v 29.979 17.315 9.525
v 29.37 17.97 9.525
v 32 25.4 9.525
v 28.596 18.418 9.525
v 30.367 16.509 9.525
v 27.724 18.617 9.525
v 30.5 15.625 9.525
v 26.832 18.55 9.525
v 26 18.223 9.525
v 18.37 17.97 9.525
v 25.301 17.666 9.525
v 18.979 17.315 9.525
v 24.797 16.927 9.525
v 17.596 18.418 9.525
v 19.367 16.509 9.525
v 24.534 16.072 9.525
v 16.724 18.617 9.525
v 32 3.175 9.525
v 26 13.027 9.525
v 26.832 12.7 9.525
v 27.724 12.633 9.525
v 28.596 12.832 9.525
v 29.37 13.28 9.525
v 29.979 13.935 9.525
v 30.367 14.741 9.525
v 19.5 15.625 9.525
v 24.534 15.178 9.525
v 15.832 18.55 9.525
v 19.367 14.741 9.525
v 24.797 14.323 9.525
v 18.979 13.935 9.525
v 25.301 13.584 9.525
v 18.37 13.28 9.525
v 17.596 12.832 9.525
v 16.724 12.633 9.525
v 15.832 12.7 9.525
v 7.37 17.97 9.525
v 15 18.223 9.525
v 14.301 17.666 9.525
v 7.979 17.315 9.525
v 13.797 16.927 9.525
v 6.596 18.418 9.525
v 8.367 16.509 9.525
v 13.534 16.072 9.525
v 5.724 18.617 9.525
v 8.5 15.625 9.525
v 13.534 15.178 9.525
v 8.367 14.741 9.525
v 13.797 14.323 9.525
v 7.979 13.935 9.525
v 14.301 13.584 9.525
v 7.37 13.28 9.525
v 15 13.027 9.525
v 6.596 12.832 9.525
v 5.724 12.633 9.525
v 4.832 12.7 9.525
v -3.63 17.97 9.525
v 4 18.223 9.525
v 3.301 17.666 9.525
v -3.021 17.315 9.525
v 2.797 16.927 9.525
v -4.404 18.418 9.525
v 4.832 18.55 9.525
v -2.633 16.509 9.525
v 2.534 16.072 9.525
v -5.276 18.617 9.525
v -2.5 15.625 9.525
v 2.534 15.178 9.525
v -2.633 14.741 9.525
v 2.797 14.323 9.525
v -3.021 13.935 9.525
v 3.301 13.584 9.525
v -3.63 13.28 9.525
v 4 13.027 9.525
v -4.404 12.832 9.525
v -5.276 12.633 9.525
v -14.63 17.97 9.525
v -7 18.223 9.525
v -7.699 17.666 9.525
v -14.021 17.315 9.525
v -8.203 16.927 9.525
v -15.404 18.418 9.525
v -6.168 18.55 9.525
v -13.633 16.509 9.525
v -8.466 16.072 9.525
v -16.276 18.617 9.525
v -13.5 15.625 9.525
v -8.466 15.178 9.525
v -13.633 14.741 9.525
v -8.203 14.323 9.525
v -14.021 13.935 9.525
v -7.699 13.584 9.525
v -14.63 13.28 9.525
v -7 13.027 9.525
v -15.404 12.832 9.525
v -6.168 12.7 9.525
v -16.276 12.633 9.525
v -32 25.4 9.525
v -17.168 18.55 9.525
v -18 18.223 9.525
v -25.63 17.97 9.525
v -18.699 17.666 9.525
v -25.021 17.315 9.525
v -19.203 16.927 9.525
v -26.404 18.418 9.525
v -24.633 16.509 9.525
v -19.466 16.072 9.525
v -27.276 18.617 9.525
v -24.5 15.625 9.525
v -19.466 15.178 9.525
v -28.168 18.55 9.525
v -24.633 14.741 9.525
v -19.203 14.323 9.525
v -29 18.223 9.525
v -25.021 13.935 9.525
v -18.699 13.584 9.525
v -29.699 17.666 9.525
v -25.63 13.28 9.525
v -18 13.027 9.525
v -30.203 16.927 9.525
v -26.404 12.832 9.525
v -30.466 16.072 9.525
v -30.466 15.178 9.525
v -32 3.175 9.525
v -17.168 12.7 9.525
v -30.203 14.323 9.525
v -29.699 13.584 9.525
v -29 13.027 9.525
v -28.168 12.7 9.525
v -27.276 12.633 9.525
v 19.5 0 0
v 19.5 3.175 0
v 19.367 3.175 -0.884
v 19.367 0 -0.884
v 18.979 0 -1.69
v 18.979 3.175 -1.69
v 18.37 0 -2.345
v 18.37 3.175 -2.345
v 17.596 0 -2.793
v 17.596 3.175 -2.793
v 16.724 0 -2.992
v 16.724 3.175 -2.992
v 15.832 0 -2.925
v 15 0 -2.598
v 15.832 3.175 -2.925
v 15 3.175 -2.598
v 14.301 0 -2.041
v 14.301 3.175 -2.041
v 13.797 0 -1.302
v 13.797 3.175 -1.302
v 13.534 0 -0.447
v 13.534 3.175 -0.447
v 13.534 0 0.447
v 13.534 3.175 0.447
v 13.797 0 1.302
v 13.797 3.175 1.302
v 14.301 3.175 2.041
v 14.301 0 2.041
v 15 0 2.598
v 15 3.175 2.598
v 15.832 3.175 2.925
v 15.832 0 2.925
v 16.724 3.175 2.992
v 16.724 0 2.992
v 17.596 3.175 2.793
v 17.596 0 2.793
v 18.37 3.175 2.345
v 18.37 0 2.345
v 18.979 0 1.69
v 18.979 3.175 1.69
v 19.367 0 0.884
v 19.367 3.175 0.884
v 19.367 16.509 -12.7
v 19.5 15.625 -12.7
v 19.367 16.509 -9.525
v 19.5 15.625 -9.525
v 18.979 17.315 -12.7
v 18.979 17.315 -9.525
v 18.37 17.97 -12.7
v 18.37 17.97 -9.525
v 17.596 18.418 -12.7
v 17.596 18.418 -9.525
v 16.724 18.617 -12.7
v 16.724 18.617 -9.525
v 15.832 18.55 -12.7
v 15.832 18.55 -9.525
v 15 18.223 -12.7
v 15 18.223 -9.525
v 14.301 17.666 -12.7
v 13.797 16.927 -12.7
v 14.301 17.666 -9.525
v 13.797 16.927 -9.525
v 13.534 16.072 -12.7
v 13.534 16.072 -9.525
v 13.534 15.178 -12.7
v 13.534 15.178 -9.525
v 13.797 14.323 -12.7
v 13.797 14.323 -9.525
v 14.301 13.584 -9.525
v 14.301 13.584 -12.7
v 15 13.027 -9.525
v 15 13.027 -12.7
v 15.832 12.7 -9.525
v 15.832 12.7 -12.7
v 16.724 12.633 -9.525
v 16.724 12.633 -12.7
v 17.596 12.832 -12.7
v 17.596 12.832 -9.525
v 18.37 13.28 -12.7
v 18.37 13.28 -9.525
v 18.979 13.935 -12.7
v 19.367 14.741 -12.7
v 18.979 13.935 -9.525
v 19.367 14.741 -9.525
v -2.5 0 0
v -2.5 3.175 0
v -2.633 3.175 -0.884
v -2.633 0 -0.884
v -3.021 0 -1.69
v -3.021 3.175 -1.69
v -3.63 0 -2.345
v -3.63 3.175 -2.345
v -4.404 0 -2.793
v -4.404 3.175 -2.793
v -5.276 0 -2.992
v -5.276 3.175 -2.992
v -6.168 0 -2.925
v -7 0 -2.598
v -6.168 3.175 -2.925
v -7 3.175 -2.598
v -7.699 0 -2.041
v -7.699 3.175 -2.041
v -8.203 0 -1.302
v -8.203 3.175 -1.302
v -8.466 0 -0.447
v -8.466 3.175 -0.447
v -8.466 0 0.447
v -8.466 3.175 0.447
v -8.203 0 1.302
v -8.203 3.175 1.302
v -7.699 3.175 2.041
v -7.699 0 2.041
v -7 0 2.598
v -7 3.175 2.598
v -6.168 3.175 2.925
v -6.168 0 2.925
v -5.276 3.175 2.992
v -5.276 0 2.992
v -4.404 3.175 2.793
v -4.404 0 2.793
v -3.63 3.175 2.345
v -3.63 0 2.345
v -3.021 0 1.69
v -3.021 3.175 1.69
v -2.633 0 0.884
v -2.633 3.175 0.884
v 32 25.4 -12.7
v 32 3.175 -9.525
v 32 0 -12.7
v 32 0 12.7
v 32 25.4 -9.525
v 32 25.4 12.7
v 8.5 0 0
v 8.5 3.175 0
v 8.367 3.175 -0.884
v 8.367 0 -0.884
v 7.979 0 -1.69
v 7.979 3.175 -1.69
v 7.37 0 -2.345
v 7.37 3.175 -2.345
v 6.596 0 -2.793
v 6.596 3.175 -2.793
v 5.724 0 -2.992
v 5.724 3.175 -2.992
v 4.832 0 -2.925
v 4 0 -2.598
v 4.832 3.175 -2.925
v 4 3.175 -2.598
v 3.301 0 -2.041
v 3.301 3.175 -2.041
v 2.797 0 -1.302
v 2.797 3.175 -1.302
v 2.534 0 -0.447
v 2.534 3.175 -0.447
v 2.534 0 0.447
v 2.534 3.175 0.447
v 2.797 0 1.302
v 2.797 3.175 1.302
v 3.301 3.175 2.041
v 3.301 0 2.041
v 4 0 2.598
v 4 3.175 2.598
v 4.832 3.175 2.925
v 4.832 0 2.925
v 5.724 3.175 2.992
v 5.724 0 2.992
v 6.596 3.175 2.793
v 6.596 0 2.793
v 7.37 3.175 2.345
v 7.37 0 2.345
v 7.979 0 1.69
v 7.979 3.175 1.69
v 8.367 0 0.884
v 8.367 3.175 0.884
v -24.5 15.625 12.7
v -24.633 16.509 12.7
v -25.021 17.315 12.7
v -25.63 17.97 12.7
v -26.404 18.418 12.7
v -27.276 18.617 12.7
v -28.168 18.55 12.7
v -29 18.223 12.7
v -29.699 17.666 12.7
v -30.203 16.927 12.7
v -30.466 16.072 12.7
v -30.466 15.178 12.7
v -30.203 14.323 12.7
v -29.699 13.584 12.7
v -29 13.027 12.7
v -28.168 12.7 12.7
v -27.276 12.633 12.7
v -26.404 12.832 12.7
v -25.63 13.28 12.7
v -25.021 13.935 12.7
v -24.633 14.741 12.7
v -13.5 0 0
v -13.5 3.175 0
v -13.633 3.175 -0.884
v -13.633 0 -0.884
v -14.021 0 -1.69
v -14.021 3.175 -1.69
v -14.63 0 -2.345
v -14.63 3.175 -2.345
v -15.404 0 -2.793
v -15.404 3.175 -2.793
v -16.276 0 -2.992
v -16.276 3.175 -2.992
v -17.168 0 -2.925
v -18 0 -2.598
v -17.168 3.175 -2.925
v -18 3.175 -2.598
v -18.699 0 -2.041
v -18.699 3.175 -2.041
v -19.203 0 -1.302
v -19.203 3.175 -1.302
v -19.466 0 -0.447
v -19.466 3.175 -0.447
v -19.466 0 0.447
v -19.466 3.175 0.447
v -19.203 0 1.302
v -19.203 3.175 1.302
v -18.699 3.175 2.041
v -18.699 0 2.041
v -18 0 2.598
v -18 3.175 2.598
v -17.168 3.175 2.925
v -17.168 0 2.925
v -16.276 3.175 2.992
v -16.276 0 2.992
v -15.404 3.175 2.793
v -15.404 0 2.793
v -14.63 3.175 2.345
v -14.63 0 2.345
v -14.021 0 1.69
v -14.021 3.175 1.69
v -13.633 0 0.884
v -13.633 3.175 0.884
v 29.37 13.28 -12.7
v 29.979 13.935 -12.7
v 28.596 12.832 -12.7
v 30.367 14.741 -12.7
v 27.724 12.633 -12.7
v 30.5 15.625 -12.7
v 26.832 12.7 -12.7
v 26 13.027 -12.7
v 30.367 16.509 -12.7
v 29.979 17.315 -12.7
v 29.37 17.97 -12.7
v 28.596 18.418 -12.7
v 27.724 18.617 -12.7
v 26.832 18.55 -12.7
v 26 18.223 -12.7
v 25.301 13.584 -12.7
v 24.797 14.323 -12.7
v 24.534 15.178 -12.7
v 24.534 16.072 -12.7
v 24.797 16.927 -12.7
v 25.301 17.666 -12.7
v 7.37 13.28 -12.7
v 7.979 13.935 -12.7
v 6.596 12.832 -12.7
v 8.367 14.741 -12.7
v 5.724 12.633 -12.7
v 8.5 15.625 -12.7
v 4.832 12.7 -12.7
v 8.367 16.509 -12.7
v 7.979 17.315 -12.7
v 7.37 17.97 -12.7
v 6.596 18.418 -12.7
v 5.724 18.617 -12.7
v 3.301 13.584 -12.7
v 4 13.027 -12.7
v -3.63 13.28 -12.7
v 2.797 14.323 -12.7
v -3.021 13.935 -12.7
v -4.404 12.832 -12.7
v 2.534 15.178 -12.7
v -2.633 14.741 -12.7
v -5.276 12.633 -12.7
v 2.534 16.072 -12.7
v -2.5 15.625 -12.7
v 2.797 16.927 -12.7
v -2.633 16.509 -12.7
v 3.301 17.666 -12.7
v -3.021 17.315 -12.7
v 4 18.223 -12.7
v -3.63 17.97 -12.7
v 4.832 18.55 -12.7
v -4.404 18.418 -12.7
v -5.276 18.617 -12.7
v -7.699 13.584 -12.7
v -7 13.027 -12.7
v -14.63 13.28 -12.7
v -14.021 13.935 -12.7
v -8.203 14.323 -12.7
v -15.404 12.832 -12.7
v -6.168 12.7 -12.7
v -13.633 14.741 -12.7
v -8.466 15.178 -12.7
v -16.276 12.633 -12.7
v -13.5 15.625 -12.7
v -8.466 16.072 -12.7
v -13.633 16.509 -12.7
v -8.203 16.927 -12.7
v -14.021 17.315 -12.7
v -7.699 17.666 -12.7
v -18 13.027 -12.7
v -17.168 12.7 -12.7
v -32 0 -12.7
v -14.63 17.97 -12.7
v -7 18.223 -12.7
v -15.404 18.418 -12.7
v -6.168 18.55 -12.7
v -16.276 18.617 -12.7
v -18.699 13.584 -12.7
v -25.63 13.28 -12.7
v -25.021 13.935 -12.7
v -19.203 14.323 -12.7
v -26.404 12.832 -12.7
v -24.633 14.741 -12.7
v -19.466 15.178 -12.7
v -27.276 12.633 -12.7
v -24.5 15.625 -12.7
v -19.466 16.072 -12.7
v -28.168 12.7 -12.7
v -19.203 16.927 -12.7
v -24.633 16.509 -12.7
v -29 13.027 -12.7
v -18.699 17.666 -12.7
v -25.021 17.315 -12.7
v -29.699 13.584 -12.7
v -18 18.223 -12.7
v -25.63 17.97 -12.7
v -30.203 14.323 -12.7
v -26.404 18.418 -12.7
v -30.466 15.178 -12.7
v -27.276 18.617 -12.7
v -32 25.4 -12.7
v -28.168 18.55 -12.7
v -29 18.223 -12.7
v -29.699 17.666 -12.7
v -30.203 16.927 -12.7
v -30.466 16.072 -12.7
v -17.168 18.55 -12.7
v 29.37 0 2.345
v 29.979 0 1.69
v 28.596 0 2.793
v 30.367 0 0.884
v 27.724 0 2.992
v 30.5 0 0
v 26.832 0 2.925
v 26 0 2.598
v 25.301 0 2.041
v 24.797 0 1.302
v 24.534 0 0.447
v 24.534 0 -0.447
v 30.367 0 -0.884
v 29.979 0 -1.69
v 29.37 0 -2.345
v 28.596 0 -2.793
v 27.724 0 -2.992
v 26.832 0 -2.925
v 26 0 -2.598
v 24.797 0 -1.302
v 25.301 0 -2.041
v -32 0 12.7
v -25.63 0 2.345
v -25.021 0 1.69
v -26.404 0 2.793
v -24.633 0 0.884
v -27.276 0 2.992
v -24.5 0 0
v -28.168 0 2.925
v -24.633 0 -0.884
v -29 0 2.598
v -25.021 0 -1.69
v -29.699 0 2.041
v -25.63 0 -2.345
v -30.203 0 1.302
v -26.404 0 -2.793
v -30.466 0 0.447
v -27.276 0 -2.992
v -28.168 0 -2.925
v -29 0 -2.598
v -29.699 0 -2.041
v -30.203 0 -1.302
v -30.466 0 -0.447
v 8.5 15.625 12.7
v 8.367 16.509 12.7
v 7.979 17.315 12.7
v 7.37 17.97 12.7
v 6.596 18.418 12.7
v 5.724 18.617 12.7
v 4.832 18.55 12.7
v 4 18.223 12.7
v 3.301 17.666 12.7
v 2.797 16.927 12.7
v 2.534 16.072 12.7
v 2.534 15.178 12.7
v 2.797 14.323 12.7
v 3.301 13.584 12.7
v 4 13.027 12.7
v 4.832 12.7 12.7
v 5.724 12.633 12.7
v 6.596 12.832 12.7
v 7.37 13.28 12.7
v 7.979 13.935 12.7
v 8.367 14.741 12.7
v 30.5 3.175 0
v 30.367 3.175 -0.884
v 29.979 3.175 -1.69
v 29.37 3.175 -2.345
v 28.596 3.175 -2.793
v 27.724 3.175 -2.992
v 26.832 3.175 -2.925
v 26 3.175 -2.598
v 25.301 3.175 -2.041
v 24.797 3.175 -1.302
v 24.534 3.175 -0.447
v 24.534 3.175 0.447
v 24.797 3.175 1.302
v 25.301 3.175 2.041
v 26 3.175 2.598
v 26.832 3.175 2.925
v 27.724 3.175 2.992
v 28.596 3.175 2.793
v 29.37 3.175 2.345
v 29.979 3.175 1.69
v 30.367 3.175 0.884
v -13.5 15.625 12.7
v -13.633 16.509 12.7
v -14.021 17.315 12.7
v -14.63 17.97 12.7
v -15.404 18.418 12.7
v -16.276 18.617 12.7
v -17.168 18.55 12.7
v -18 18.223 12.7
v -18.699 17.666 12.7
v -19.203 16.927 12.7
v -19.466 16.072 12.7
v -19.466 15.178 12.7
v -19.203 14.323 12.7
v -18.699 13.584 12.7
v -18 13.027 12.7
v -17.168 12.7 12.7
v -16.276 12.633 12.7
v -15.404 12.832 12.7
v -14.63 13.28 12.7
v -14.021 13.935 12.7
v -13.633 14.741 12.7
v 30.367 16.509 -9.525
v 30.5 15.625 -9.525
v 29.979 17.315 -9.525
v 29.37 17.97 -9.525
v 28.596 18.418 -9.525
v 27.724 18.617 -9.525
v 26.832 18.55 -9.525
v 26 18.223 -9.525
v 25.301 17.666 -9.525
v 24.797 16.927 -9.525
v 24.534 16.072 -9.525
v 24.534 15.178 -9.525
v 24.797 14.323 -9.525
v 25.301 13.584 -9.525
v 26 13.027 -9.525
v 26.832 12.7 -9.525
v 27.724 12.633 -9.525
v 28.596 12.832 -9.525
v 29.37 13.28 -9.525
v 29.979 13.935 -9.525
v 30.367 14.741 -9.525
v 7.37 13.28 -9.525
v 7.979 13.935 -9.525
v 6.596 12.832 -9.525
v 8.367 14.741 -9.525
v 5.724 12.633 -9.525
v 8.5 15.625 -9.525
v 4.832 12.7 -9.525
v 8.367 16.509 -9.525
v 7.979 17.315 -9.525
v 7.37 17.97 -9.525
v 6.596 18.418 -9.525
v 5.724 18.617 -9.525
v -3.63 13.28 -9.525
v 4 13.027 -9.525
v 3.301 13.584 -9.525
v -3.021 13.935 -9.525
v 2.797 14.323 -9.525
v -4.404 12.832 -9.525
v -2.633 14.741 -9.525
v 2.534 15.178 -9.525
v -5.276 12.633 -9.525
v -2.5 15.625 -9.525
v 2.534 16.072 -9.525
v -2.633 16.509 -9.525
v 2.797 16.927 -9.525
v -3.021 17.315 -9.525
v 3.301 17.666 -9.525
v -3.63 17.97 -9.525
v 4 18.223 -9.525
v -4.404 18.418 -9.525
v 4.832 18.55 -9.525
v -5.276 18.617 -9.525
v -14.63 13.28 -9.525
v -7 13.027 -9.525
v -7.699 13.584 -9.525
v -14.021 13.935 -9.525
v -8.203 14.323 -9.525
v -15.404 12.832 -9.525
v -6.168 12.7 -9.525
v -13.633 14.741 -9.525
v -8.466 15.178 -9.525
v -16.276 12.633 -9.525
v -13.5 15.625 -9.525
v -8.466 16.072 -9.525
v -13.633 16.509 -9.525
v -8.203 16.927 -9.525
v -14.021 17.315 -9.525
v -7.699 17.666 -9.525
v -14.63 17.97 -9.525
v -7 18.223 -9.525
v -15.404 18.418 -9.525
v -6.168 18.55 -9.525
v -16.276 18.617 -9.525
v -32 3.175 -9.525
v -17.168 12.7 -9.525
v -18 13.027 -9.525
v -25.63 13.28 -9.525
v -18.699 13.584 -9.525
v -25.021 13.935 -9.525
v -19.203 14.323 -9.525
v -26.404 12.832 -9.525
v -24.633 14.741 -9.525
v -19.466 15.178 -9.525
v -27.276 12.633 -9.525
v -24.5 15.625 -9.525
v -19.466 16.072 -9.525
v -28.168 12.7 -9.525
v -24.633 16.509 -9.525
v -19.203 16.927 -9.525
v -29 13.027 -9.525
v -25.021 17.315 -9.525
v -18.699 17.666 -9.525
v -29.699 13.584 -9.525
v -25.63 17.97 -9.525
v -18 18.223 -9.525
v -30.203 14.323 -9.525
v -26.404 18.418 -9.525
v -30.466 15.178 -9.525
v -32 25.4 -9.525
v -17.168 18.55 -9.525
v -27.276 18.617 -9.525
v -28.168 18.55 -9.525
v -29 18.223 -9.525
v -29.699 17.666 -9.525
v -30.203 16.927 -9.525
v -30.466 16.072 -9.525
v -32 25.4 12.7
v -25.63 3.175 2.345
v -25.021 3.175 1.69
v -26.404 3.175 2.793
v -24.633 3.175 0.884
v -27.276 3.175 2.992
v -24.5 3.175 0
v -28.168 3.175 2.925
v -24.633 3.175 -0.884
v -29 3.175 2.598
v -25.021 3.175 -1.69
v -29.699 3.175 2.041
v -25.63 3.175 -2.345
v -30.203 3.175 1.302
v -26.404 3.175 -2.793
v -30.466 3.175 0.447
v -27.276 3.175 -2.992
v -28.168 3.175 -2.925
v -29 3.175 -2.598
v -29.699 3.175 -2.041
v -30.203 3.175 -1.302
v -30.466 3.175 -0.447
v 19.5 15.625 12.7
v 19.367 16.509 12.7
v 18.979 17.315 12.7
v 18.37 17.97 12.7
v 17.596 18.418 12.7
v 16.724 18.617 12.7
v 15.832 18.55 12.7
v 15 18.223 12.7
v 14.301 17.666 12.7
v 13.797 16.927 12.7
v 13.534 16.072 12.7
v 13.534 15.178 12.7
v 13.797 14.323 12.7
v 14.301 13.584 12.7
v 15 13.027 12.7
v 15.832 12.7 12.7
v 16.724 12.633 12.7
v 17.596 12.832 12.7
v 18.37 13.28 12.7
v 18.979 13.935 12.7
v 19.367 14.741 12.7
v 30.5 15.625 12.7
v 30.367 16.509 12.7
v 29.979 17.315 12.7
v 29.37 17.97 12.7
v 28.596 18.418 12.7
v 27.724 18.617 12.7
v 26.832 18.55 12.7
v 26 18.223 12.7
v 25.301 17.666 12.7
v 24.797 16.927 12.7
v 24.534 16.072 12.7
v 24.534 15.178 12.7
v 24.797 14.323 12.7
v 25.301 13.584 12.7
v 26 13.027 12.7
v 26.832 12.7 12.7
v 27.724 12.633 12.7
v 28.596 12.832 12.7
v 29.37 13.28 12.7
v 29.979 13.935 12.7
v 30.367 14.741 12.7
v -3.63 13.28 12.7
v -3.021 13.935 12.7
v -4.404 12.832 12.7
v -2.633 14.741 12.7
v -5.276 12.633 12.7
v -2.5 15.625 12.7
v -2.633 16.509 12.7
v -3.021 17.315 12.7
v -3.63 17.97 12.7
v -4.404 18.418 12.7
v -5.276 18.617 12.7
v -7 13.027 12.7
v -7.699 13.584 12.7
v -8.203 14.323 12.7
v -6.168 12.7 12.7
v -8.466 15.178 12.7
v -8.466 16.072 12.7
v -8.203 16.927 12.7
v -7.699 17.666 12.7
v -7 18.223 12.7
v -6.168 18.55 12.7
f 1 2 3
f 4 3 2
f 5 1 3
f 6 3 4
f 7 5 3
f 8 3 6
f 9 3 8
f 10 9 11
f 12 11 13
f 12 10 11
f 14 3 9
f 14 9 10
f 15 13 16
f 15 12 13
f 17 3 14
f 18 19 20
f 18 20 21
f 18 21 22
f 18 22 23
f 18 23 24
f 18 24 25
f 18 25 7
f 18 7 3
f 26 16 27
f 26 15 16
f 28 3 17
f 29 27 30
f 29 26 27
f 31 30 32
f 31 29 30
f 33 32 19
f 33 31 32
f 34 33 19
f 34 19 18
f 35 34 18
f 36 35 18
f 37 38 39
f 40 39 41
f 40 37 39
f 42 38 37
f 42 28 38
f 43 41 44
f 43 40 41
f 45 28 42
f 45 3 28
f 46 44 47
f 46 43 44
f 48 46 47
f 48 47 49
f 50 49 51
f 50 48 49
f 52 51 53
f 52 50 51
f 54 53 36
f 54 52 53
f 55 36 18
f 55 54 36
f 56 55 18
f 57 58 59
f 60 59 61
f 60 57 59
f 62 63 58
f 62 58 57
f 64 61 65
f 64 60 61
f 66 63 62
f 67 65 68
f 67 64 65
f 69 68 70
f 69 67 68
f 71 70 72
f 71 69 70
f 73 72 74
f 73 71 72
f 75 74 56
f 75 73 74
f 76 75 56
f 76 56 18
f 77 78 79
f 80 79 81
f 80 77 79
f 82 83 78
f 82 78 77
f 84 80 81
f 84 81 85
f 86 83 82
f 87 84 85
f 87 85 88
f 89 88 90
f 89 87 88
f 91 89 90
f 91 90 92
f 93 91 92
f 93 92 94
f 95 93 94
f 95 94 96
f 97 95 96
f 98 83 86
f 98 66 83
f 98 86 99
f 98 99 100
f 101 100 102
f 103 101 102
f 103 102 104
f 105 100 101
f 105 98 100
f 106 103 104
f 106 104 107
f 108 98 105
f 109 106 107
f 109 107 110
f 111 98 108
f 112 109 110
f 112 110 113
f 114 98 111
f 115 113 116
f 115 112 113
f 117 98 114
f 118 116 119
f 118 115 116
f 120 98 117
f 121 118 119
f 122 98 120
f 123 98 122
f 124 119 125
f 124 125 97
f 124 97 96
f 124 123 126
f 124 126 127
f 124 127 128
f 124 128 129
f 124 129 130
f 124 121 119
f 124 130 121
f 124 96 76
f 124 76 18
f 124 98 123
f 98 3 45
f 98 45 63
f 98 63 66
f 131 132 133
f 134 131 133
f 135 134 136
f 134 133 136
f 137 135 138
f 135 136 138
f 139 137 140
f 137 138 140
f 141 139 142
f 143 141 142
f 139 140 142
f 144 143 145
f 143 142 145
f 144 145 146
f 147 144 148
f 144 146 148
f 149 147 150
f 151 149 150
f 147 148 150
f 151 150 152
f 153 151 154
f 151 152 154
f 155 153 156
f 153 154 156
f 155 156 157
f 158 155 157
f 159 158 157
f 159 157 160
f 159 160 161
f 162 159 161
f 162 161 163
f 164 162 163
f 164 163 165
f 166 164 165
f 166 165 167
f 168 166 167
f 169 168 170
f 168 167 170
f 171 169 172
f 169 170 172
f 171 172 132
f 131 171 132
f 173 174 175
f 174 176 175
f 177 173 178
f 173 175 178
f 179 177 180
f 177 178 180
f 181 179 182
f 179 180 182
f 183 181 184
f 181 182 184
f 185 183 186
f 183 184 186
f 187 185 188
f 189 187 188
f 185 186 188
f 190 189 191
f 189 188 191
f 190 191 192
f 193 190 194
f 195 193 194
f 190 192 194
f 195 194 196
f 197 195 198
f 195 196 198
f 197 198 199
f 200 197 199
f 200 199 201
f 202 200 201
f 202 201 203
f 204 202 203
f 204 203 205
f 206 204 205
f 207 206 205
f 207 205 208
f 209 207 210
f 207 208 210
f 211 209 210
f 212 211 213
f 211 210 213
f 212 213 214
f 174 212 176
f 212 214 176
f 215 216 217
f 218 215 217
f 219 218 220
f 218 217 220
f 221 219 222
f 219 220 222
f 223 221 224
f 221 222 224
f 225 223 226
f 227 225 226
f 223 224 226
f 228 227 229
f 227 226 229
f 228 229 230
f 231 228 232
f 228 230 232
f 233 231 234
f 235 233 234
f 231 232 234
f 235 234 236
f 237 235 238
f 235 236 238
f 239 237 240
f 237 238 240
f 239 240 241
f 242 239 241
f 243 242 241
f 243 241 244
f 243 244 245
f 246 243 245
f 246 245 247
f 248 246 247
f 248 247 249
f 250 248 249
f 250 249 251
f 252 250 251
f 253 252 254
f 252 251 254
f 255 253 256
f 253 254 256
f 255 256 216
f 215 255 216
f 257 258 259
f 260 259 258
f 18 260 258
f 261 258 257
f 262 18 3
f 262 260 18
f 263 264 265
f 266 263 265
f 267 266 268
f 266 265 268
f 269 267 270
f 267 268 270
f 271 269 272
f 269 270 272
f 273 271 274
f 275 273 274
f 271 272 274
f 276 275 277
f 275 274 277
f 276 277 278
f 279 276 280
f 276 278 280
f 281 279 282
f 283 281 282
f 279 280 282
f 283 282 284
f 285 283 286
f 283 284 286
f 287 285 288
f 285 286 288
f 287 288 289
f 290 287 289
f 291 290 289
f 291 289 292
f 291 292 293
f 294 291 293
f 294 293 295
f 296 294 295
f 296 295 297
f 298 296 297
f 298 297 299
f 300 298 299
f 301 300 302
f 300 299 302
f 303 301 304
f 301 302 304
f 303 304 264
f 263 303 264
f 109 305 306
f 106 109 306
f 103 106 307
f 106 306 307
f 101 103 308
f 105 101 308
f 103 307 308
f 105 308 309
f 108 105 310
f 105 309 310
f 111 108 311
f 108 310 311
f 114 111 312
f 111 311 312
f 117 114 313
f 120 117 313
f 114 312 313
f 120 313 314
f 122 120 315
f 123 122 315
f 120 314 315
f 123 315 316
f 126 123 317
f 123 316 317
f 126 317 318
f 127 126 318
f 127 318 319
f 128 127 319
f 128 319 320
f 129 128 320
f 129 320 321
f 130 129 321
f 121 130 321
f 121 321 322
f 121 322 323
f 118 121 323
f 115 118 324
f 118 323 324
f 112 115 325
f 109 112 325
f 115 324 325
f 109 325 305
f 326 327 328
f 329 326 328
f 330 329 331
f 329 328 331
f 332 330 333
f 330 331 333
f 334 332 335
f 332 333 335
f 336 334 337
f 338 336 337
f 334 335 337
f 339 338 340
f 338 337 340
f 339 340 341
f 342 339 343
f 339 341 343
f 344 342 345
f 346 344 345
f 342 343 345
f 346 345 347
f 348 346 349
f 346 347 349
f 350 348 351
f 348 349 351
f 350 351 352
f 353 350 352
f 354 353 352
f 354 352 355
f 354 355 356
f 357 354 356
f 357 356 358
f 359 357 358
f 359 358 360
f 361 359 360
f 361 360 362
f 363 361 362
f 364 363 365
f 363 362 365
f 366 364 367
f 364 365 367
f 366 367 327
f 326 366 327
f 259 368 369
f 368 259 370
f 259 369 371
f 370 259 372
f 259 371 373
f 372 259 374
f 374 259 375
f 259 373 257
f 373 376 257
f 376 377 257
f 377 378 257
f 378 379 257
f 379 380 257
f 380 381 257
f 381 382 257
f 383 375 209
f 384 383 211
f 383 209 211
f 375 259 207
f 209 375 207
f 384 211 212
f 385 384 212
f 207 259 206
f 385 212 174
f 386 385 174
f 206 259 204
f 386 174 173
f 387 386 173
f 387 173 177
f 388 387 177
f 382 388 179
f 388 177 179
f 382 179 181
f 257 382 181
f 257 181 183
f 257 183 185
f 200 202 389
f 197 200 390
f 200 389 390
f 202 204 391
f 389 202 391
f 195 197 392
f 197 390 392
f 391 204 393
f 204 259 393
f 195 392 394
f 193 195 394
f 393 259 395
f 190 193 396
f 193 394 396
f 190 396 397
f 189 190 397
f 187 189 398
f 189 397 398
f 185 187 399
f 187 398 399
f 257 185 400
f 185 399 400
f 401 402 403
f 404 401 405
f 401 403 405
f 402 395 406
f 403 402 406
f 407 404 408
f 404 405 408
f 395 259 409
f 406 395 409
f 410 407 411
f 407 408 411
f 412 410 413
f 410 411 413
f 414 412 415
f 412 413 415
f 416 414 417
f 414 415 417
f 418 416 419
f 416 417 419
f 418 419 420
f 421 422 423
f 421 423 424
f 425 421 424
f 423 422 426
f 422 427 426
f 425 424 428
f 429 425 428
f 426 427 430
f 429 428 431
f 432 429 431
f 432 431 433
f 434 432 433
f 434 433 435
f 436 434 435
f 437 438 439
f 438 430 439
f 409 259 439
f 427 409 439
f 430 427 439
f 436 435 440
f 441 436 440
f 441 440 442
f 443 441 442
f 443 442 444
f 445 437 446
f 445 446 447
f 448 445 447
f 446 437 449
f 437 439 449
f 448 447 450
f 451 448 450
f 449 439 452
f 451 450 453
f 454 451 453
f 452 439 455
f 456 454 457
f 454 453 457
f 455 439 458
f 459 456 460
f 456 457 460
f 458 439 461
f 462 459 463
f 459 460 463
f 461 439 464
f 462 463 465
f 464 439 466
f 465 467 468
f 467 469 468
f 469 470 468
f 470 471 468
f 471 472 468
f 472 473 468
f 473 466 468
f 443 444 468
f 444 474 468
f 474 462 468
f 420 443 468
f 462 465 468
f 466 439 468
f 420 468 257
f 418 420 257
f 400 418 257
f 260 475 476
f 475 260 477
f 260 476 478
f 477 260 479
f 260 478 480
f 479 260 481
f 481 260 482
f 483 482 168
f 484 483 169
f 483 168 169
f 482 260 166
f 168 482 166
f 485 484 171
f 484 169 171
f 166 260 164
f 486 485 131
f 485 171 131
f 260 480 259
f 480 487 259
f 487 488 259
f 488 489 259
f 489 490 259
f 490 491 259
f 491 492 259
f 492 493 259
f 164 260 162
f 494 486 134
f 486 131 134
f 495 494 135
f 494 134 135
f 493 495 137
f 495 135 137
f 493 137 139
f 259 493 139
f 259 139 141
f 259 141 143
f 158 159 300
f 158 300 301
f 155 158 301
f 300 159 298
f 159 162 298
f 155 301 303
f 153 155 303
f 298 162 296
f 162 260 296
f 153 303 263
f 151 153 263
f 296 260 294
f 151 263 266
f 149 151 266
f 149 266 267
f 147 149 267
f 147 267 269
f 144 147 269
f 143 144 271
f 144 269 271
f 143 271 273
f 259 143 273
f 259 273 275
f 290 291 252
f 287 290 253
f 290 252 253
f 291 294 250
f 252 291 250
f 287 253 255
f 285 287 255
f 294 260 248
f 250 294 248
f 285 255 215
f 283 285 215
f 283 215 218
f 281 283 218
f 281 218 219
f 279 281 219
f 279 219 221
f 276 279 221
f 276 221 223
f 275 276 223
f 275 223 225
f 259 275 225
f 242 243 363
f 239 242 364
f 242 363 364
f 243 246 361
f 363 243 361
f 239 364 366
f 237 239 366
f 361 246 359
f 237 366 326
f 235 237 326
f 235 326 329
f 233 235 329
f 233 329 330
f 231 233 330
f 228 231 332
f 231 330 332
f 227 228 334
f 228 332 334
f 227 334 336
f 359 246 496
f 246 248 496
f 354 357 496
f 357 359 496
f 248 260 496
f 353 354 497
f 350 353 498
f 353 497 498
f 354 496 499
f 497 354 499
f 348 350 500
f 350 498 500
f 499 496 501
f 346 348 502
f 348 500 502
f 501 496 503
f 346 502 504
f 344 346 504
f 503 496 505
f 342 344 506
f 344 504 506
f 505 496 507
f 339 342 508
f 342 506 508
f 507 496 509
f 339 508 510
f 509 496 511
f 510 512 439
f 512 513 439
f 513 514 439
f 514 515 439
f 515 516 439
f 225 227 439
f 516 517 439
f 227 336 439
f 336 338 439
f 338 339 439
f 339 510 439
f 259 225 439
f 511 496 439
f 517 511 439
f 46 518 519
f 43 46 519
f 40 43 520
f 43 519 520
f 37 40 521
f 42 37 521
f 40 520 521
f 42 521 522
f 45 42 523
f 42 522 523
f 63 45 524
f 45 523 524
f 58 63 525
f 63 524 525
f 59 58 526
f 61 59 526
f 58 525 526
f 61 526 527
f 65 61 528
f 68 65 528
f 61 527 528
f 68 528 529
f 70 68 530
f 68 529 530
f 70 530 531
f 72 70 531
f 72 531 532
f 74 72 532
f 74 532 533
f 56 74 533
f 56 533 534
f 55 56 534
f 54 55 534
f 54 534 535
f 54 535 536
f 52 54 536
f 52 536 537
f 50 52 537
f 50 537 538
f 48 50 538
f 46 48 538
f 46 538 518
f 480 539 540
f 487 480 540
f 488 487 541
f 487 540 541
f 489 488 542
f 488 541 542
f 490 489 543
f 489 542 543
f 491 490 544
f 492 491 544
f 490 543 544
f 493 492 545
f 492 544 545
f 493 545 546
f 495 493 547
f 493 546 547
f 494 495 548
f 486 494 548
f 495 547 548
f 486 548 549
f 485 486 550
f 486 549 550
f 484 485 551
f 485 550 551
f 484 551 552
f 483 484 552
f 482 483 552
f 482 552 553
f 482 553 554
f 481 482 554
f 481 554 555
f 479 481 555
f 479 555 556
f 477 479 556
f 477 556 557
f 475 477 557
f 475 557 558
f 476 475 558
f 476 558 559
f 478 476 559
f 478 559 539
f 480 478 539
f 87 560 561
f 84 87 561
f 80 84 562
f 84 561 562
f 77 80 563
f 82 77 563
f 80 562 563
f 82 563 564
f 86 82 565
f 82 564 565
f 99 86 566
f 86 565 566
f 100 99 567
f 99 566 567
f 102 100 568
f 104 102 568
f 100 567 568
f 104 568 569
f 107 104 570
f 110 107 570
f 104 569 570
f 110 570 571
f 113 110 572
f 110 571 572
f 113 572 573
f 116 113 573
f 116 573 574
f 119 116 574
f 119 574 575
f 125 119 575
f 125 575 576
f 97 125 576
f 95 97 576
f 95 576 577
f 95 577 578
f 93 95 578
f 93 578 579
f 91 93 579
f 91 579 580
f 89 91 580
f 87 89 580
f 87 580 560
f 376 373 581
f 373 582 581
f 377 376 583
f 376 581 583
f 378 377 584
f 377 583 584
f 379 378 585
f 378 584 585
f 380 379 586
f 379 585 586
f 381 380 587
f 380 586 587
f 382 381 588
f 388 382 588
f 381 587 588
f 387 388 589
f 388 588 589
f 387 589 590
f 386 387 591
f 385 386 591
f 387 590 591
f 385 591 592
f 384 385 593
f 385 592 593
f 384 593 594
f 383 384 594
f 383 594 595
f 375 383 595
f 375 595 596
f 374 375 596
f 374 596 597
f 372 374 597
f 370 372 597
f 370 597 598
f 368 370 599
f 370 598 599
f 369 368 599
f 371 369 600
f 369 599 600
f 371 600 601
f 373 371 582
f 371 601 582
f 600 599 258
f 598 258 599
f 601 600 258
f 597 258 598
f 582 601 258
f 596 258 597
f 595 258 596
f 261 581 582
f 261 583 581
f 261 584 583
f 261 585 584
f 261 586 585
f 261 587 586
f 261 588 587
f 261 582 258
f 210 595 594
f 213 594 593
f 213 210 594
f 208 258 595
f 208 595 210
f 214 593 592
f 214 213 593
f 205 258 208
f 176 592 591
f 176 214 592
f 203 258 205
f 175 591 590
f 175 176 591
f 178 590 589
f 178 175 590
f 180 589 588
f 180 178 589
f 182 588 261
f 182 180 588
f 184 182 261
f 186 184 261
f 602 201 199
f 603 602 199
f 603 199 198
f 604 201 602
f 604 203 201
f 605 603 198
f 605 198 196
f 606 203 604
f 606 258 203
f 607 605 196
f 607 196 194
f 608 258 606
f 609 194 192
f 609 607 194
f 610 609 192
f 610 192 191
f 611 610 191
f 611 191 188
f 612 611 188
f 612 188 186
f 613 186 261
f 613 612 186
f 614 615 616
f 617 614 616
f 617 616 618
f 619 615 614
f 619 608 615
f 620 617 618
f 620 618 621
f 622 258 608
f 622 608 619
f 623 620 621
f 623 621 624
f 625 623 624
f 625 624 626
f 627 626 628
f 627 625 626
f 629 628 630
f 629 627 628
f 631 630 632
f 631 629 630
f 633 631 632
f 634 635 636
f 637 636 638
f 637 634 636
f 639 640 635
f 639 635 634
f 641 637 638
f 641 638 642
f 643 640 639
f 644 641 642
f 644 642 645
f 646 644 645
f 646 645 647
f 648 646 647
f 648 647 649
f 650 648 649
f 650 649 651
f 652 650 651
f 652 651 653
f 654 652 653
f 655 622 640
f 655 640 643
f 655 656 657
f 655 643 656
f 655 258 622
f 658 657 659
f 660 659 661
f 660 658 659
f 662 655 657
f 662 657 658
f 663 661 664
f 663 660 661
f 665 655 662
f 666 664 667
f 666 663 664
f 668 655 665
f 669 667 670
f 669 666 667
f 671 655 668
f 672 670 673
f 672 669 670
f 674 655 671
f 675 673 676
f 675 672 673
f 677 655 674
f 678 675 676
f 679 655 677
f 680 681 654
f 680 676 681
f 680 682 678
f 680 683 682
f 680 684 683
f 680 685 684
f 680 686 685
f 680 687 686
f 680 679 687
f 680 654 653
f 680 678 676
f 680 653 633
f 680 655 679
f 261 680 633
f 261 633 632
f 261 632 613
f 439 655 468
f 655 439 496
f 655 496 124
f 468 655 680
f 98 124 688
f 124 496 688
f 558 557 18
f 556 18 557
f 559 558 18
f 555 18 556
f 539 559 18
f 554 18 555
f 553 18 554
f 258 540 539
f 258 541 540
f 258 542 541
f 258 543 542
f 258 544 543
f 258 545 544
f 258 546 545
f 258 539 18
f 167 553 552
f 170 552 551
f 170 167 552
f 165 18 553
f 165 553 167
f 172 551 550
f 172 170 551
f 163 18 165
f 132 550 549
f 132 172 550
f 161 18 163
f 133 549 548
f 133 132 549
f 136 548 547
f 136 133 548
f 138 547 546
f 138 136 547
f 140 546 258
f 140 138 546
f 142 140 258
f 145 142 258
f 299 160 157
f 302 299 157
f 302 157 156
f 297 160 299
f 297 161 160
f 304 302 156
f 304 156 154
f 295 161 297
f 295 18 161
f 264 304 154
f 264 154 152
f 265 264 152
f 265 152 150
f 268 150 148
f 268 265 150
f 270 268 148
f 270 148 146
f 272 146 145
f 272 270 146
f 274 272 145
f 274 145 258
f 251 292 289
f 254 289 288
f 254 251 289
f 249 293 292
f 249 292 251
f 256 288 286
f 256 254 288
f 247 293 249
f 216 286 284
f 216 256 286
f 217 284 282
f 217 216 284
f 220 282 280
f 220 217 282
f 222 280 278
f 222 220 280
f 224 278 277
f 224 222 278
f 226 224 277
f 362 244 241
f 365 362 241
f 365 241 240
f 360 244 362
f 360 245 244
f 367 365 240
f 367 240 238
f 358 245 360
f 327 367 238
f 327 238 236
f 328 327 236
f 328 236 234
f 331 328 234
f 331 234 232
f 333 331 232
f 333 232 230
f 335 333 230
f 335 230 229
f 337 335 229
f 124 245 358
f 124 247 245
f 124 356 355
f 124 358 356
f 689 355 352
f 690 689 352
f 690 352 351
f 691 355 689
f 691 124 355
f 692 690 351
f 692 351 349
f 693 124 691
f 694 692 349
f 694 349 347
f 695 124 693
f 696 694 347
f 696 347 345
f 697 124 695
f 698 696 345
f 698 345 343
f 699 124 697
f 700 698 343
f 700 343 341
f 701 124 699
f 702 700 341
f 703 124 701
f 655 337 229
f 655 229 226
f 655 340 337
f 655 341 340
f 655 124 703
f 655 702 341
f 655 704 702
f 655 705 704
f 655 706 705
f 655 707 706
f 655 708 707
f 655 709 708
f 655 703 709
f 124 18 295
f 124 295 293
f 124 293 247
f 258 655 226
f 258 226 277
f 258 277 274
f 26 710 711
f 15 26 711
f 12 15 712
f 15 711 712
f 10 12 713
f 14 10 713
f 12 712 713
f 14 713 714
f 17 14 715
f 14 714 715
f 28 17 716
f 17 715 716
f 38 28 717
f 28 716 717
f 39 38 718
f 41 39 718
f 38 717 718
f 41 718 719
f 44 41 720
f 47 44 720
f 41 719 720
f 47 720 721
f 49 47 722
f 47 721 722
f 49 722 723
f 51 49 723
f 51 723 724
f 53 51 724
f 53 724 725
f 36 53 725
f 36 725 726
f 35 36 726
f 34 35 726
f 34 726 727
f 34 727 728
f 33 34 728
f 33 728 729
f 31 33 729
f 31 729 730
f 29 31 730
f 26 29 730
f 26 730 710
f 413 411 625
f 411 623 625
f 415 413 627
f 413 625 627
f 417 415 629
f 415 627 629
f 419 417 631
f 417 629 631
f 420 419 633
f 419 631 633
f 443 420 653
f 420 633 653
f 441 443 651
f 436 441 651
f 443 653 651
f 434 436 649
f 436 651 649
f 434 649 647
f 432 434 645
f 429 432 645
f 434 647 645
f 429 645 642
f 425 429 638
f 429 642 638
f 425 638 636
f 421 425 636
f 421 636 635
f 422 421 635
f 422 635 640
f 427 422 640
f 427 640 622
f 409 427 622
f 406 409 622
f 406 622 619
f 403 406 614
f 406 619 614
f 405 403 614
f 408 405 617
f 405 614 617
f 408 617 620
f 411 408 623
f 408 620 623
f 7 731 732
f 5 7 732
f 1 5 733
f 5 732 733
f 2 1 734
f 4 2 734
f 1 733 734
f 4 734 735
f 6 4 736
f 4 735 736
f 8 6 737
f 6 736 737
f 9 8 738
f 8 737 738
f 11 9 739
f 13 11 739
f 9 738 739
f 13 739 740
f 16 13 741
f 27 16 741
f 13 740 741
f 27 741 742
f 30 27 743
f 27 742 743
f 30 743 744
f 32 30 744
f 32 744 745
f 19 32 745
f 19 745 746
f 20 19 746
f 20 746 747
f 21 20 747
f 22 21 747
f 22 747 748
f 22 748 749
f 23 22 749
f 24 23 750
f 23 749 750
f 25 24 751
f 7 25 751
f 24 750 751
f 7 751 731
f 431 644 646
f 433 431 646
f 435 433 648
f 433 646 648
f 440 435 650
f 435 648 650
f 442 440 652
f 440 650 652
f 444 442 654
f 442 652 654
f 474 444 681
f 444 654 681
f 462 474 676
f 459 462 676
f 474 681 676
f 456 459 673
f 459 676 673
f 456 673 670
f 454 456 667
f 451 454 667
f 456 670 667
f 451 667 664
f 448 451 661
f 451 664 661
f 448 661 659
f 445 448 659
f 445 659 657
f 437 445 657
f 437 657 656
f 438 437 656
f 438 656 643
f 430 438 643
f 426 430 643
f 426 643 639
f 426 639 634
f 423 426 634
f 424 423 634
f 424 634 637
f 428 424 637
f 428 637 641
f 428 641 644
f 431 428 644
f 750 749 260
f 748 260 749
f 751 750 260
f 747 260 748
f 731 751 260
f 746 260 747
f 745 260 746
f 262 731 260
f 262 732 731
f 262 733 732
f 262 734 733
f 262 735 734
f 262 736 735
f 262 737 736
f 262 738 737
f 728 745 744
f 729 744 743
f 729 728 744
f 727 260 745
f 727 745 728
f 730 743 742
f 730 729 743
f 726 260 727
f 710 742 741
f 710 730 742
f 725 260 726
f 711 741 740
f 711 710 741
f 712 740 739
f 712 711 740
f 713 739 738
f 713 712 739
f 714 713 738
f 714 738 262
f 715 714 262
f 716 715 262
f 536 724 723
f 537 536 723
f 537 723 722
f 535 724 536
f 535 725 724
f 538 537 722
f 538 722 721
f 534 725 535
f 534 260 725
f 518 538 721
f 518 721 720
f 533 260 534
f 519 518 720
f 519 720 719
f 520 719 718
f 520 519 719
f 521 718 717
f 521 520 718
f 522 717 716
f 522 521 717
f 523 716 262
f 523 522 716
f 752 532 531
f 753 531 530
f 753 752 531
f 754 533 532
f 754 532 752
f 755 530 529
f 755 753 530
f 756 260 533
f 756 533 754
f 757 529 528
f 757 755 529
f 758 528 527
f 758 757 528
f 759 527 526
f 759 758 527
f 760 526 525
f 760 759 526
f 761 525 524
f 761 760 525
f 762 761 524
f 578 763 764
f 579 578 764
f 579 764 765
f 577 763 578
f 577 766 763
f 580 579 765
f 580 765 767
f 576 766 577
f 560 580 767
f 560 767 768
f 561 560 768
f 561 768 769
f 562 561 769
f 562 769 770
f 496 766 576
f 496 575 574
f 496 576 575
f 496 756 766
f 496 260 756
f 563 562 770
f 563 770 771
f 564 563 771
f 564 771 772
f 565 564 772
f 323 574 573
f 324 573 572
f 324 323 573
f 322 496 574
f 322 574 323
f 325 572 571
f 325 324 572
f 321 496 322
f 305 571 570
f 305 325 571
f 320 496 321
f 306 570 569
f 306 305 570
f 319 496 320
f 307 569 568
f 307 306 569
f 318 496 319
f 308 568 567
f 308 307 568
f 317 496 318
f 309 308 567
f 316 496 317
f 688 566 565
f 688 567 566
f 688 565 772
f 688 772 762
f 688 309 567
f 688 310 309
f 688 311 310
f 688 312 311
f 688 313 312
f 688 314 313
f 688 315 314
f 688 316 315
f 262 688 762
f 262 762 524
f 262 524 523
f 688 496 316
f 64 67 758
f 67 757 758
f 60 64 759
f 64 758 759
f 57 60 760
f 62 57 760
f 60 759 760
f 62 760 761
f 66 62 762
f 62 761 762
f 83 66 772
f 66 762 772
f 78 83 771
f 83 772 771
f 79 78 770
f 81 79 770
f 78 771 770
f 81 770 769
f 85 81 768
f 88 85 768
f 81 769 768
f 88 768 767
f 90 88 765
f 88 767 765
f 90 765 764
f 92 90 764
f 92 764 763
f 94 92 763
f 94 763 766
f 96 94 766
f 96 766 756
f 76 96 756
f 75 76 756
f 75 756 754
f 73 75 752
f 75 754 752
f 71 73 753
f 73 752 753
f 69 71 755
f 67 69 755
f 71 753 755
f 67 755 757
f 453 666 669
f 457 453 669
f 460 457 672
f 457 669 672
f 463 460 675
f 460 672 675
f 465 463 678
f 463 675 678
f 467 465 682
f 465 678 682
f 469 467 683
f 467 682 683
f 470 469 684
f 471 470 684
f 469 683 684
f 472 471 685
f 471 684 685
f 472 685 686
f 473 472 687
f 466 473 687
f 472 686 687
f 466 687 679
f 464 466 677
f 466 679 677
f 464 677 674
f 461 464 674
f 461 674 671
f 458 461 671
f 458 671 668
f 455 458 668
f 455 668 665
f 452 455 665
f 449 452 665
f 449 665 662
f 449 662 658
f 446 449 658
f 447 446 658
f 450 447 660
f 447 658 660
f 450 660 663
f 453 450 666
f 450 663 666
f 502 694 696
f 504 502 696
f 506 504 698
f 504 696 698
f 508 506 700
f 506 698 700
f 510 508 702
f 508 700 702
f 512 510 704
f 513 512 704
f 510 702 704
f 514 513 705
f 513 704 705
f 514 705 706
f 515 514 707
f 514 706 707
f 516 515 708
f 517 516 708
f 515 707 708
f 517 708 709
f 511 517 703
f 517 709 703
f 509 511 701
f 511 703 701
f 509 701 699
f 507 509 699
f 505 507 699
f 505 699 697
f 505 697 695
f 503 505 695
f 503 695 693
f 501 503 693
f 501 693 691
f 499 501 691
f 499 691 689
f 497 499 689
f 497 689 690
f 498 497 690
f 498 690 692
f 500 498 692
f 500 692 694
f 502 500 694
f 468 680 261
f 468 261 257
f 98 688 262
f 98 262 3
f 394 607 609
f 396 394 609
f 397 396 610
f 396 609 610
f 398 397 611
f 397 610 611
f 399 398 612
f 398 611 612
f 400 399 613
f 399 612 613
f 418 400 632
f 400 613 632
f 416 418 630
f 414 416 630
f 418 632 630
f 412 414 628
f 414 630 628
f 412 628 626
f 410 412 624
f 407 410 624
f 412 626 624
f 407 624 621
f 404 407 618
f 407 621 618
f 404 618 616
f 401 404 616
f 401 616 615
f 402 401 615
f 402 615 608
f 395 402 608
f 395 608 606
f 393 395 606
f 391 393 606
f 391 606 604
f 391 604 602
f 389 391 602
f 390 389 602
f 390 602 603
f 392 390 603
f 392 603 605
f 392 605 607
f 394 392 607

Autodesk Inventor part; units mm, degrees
ref_plane "YZ Plane" through (0, 0, 0) normal (1, 0, 0) x (0, 1, 0)
ref_plane "XZ Plane" through (0, 0, 0) normal (0, 1, 0) x (-1, 0, 0)
ref_plane "XY Plane" through (0, 0, 0) normal (0, 0, 1) x (1, 0, 0)
sketch "Sketch1" plane through (0, 0, 0) normal (1, 0, 0) x (0, 1, 0)
  line L0 (0, 12.7) -> (0, -12.7)
  line L1 (0, 12.7) -> (25.4, 12.7)
  line L2 (0, -12.7) -> (25.4, -12.7)
  line L3 (25.4, 9.525) -> (3.175, 9.525)
  line L4 (3.175, 9.525) -> (3.175, -9.525)
  line L5 (3.175, -9.525) -> (25.4, -9.525)
  line L6 (25.4, 12.7) -> (25.4, 9.525)
  line L7 (25.4, -9.525) -> (25.4, -12.7)
  point P0 (0, 0)
  point P1 (0, 0)
  dimension "d0" = 25.4
  dimension "d1" = 25.4
  dimension "d2" = 25.4
  dimension "d3" = 3.175
extrude "Extrusion1" add sketch "Sketch1" along normal mid plane 64
sketch "Sketch2" plane through (-32, 3.175, 9.525) normal (0, 1, 0) x (1, 0, 0)
  circle A0 centre (4.5, 9.525) radius 3
  line L0 (0, 0) -> (0, 19.05) construction
  line L1 (0, 19.05) -> (64, 19.05) construction
  circle A1 centre (15.5, 9.525) radius 3
  circle A2 centre (26.5, 9.525) radius 3
  circle A3 centre (37.5, 9.525) radius 3
  circle A4 centre (48.5, 9.525) radius 3
  circle A5 centre (59.5, 9.525) radius 3
  point P0 (32, 9.525)
  point P1 (0, 9.525)
  point P2 (0, 9.525)
  dimension "d6" = 6
  dimension "d7" = 4.5
  dimension "d10" = 11
extrude "Extrusion2" cut sketch "Sketch2" against normal through all
sketch "Sketch3" plane through (-32, 0, 12.7) normal (0, 0, 1) x (1, 0, 0)
  line L0 (0, 3.175) -> (64, 3.175) construction
  line L1 (64, 25.4) -> (64, 3.175) construction
  line L2 (0, 25.4) -> (64, 25.4) construction
  line L3 (0, 3.175) -> (0, 25.4) construction
  circle A0 centre (4.5, 15.625) radius 3
  circle A1 centre (15.5, 15.625) radius 3
  circle A2 centre (26.5, 15.625) radius 3
  circle A3 centre (37.5, 15.625) radius 3
  circle A4 centre (48.5, 15.625) radius 3
  circle A5 centre (59.5, 15.625) radius 3
  point P0 (32, 0)
  dimension "d17" = 6
  dimension "d18" = 12.45
  dimension "d19" = 4.5
  dimension "d22" = 11
extrude "Extrusion3" cut sketch "Sketch3" against normal through all
properties part number "ArmSupport_C-Channel"
